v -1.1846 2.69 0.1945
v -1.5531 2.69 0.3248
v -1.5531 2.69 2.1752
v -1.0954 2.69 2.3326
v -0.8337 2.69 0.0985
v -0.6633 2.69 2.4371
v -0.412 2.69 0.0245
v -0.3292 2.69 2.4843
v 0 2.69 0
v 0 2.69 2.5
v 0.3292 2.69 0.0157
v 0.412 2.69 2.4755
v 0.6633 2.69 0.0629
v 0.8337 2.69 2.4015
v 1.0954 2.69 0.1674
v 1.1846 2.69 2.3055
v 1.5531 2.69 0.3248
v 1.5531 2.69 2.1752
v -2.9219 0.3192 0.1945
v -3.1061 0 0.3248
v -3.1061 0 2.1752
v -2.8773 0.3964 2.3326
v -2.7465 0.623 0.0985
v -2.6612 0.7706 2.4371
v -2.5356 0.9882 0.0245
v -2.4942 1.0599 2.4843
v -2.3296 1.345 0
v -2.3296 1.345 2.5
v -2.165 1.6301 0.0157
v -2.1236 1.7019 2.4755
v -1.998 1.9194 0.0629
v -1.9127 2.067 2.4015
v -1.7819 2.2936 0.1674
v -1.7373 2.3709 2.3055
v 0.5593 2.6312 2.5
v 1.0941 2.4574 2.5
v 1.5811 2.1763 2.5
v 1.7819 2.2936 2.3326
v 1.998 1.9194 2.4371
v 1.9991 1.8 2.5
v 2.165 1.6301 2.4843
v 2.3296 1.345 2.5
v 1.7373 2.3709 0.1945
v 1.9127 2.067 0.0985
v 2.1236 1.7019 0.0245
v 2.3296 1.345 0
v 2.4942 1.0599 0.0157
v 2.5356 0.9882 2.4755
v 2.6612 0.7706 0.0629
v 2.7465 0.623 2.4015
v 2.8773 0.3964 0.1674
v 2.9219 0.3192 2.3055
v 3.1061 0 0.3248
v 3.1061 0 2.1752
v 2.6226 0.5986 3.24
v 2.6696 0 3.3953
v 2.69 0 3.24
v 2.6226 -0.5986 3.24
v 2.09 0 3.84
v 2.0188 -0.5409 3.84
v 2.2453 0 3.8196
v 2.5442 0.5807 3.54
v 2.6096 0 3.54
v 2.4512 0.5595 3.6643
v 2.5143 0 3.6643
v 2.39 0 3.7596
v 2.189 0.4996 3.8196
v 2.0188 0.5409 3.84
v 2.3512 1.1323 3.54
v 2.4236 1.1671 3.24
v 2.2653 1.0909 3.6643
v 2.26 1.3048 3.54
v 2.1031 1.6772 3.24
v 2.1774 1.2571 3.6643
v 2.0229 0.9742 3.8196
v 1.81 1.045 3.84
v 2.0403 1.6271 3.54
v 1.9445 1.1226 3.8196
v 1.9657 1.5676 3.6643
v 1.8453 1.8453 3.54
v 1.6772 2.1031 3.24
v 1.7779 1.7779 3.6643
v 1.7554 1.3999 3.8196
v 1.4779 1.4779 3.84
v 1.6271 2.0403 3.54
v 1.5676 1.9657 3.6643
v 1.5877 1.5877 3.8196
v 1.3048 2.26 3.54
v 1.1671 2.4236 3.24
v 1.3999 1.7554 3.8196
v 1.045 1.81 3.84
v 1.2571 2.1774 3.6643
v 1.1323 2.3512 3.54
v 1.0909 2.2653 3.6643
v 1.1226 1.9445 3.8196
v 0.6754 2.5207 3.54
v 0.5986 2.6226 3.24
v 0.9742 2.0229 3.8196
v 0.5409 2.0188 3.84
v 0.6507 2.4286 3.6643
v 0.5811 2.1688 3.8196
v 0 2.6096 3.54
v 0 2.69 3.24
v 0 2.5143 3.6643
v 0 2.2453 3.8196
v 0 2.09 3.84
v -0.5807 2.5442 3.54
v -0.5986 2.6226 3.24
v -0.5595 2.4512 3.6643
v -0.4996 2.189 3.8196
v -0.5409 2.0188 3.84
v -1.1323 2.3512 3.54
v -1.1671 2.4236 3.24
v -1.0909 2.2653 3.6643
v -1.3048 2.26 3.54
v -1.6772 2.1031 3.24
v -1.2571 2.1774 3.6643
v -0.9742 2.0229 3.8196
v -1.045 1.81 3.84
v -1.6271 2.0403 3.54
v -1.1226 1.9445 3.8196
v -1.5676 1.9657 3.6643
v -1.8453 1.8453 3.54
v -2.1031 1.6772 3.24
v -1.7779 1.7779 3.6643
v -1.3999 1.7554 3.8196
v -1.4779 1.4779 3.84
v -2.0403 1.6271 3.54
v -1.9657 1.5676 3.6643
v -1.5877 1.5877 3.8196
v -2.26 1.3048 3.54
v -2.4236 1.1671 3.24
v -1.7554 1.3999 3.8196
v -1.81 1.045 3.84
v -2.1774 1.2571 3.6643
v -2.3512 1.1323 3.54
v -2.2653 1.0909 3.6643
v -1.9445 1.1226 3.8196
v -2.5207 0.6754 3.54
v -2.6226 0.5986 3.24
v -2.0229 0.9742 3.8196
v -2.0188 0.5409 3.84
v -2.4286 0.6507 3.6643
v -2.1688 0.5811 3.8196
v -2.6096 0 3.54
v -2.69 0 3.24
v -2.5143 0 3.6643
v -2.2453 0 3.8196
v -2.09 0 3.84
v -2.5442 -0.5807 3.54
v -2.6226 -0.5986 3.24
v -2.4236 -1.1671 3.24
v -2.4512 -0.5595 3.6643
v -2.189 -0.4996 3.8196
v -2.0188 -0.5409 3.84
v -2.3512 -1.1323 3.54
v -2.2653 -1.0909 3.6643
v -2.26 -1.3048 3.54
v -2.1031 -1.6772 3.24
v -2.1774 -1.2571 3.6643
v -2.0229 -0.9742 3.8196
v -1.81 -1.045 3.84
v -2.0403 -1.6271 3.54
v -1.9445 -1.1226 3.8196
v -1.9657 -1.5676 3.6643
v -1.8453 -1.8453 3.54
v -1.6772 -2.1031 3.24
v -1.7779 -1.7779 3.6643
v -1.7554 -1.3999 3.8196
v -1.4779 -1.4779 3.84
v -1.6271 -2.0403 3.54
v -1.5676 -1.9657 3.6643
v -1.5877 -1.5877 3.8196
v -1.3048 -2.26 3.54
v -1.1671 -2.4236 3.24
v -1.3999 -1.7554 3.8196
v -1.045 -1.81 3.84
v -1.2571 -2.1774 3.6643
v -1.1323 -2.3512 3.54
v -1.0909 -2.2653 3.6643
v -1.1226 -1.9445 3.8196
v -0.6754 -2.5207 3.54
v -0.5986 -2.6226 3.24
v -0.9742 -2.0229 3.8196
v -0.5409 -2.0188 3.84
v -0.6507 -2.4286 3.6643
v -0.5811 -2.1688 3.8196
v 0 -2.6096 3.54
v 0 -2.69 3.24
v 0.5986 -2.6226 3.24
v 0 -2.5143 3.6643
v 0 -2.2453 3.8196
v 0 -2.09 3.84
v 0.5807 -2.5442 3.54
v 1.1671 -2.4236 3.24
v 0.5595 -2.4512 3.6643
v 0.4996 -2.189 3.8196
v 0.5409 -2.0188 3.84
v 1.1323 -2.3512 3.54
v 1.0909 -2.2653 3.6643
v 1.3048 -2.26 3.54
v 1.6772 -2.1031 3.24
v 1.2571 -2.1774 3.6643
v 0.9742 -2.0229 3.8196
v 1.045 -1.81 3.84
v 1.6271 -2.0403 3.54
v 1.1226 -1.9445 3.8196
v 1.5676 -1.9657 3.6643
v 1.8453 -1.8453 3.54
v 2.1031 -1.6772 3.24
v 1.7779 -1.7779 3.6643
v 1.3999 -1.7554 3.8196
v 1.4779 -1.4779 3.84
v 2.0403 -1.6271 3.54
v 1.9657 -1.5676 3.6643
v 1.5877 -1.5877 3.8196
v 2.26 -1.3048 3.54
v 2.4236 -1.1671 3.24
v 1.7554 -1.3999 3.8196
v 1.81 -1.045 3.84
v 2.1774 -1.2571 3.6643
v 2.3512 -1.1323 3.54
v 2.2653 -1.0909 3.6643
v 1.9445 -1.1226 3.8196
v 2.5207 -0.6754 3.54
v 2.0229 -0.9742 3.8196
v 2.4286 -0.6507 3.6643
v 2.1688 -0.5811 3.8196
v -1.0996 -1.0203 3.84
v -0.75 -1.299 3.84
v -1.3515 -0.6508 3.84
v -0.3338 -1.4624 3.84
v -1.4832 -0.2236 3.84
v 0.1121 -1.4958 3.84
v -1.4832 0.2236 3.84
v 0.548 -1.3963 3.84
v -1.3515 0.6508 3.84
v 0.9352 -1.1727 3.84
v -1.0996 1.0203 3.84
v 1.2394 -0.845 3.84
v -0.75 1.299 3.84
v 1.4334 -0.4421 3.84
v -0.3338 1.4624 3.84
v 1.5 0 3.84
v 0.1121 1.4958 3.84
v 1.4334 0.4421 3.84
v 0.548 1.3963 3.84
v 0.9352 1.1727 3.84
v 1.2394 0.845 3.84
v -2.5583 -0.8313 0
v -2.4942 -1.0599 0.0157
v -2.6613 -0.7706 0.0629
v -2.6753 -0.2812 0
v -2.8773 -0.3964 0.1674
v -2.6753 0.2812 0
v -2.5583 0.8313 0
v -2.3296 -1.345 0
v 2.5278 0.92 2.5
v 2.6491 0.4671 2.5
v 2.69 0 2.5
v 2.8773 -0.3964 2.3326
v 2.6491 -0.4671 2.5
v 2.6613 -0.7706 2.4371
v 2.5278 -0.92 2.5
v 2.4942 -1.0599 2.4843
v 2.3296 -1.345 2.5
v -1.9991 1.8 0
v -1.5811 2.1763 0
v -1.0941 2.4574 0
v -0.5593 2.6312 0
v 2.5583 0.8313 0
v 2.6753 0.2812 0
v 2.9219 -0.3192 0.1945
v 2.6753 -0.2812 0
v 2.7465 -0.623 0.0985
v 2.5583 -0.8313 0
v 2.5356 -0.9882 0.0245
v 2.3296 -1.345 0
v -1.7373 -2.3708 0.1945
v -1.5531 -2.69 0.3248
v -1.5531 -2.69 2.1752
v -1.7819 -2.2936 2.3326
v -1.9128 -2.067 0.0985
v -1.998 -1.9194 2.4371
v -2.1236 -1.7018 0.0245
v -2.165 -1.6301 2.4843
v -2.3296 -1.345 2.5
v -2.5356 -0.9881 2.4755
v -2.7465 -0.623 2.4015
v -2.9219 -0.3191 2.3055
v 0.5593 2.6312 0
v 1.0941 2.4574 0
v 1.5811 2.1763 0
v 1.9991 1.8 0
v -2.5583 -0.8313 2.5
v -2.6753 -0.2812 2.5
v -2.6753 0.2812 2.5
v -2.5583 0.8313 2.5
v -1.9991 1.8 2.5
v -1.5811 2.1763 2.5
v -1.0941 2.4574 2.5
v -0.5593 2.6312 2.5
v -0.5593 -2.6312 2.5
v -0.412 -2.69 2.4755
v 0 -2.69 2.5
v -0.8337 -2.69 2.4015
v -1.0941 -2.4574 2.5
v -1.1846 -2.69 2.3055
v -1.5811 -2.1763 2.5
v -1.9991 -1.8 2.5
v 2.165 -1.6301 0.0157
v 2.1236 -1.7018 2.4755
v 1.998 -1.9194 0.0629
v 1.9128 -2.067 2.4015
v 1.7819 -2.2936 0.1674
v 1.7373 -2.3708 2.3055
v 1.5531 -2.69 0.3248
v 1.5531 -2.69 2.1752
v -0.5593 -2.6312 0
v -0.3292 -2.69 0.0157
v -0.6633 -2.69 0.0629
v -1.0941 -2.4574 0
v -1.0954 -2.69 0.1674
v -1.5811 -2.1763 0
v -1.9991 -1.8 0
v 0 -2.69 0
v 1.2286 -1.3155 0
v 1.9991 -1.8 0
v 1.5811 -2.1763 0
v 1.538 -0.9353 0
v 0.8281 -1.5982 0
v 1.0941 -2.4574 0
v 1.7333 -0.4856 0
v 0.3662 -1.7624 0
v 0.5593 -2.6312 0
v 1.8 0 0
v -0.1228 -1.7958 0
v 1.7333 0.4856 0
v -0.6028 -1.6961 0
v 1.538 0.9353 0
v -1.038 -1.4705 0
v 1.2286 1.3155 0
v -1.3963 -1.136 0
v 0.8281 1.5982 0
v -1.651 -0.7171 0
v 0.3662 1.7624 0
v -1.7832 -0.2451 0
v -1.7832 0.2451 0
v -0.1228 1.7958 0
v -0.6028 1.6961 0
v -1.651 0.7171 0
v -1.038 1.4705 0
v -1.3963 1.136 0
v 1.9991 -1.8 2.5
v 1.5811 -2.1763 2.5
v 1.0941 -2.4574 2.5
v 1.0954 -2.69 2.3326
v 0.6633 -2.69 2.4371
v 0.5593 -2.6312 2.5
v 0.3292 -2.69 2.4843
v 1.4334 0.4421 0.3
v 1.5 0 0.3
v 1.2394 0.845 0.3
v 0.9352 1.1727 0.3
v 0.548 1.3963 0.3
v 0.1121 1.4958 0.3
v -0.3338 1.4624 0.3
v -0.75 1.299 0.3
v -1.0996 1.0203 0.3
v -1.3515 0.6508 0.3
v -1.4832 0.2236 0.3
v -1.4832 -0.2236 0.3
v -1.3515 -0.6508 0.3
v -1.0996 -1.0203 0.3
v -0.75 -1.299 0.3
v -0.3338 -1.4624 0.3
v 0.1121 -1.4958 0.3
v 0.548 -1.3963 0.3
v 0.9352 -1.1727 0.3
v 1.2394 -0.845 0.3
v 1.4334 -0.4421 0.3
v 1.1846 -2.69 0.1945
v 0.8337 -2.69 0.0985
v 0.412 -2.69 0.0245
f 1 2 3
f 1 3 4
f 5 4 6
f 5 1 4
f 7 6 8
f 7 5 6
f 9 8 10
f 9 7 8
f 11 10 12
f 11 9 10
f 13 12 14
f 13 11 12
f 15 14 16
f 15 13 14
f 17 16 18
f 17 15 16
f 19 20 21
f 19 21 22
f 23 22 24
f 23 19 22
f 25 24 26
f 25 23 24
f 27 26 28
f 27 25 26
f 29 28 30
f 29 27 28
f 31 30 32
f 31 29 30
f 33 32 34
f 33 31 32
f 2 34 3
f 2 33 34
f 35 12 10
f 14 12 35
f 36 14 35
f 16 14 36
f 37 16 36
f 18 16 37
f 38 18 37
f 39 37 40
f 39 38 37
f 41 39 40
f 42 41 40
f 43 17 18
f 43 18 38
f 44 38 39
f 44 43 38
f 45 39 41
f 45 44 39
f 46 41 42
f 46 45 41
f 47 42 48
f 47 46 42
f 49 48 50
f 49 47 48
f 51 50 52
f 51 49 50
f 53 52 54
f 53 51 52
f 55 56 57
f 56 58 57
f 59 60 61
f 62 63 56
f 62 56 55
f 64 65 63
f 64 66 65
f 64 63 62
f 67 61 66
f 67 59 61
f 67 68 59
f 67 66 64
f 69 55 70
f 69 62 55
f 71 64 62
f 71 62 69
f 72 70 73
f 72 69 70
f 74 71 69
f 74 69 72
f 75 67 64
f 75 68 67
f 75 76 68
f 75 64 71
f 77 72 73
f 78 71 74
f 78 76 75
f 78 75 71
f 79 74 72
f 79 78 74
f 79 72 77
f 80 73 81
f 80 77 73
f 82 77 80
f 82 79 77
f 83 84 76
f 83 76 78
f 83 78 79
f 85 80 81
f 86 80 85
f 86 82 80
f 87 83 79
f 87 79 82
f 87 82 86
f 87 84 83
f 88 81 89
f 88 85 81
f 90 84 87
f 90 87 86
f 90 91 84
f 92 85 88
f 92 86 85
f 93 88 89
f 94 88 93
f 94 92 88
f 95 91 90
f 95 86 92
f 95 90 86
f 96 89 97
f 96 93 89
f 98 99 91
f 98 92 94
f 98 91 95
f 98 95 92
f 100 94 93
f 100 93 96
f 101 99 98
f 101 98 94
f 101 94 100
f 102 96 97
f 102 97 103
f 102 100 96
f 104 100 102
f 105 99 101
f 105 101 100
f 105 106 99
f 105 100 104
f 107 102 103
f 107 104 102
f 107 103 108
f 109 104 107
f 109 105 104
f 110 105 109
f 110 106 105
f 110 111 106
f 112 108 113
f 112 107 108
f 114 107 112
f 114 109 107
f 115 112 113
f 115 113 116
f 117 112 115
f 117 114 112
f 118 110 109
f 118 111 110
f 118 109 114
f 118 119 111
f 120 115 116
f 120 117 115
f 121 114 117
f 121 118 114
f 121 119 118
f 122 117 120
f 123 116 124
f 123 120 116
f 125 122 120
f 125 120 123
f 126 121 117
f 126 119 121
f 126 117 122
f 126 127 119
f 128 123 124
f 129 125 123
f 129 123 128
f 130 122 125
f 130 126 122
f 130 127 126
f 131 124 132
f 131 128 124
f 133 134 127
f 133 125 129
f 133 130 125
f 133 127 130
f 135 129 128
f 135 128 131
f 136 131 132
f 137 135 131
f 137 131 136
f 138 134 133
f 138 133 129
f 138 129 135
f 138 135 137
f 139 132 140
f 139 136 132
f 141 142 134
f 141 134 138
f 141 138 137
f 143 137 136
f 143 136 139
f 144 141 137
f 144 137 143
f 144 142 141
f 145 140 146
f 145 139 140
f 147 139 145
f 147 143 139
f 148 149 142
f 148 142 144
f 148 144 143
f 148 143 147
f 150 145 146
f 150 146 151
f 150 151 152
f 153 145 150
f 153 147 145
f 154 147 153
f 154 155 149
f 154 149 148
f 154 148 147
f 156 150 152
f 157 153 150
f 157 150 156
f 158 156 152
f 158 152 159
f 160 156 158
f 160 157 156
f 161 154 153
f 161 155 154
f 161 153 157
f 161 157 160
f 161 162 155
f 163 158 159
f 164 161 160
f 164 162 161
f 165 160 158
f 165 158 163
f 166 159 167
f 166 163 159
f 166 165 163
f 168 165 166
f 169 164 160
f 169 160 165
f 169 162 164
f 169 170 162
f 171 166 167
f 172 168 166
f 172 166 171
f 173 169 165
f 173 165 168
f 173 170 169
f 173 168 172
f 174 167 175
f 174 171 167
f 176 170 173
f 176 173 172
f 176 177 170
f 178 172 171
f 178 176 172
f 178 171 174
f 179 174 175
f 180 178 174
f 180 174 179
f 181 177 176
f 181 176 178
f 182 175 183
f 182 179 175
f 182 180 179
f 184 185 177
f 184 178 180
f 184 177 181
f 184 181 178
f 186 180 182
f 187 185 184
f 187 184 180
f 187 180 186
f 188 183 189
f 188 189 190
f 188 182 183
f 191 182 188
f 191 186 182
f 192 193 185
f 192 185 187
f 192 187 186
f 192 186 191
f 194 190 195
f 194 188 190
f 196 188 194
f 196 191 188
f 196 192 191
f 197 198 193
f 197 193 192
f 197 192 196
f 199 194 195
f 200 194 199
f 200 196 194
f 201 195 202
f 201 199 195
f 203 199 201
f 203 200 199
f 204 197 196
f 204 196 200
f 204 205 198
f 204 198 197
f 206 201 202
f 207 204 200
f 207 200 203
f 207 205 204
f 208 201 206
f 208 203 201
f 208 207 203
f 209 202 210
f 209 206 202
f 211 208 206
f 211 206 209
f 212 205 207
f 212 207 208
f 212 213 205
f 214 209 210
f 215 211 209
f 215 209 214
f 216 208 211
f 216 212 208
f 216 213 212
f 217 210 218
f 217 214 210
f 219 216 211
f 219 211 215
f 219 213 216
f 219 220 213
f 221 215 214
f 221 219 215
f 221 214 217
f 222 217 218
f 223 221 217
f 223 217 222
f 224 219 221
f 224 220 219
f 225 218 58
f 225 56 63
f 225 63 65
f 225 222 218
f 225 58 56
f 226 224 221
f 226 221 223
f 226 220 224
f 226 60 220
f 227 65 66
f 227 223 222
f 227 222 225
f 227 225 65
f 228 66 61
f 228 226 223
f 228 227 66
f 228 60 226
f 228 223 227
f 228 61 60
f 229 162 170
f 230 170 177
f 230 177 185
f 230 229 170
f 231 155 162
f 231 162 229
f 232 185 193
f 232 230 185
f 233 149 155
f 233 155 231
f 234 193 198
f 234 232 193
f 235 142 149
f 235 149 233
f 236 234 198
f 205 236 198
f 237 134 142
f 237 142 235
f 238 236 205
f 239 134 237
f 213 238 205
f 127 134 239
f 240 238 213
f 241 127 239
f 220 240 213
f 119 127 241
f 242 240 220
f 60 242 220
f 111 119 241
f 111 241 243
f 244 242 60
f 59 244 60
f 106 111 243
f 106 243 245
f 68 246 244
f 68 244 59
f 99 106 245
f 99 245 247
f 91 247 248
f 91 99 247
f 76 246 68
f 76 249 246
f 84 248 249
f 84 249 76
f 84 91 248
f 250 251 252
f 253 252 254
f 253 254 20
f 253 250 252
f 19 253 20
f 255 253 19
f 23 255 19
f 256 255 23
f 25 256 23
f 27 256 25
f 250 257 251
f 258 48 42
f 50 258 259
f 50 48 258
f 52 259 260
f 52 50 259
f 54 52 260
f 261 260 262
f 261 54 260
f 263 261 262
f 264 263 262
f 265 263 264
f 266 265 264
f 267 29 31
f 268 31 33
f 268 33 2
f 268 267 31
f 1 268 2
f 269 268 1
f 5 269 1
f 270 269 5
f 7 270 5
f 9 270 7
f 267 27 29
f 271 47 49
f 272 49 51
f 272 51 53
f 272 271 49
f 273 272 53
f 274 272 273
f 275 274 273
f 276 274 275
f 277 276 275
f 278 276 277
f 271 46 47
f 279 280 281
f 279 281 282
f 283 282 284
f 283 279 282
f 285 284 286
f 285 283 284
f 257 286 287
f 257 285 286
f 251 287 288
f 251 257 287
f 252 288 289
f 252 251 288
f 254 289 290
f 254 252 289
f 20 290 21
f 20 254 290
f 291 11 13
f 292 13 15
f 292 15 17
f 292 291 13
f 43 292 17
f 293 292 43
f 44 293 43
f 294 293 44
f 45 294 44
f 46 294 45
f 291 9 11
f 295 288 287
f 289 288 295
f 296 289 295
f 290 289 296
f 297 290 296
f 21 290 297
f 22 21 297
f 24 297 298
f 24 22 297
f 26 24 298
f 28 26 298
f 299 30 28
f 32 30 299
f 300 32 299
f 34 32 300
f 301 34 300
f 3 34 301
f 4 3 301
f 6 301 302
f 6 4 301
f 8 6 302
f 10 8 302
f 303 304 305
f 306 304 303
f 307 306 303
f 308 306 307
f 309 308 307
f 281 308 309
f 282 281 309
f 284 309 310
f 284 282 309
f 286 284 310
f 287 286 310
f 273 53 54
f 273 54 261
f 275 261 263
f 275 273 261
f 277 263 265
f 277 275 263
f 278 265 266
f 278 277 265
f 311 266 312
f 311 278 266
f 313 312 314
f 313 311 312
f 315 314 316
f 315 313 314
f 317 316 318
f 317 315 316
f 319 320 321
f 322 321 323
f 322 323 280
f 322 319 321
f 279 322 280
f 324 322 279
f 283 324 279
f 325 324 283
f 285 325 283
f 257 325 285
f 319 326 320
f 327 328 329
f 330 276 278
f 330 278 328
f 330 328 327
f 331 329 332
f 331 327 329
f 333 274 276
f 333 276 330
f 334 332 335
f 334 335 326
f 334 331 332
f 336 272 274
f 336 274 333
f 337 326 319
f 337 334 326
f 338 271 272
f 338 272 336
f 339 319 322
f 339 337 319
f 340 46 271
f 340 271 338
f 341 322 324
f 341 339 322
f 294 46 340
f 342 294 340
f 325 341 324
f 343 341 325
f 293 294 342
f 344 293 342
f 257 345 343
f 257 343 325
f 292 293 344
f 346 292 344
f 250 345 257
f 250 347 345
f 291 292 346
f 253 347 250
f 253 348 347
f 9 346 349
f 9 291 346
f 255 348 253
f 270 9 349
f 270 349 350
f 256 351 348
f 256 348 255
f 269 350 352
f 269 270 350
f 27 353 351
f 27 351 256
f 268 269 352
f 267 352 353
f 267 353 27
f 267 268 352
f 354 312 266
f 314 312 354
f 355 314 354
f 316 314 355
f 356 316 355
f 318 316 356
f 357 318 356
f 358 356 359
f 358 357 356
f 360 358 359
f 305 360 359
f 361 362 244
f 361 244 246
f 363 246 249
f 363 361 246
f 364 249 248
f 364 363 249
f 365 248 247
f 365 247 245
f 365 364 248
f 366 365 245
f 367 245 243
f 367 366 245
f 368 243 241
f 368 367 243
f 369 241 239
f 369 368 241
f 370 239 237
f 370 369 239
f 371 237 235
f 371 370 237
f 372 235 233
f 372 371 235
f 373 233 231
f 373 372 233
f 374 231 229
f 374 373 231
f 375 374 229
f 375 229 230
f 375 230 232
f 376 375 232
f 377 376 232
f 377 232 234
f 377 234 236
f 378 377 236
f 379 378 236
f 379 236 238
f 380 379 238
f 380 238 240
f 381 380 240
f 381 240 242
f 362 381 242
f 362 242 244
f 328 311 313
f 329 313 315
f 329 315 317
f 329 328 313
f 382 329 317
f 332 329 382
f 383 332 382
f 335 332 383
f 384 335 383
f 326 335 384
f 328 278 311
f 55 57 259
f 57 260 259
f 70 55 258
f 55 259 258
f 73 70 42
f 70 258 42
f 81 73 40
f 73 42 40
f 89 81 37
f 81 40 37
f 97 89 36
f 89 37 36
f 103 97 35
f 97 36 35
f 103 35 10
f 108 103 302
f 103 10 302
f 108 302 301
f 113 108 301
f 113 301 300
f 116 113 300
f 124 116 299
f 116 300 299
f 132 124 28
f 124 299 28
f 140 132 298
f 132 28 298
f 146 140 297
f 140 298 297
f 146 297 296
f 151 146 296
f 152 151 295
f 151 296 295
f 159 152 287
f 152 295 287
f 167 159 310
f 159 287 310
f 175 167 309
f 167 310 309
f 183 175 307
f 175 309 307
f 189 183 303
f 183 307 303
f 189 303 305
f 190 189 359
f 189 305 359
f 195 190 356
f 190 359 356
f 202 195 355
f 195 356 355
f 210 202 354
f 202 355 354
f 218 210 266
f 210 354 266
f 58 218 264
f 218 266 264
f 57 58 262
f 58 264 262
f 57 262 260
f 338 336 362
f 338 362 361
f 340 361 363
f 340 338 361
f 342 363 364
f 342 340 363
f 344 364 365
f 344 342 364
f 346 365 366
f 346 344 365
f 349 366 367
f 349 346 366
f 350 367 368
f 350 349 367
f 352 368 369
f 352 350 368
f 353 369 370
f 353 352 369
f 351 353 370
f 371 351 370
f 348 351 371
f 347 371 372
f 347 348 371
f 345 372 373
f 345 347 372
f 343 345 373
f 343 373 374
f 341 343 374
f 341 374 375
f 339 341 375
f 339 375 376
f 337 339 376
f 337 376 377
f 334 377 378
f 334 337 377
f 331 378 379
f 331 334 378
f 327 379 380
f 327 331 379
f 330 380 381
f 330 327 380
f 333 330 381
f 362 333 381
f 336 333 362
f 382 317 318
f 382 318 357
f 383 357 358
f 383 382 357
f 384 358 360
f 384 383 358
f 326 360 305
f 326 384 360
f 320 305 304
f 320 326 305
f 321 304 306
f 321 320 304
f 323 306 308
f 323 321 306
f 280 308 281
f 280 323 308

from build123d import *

# Parameters (mm, degrees)
SKETCH1_R           = 1.5
BOSS_EXTRUDE1_DEPTH = 2.5
SKETCH2_R           = 2.69
SKETCH2_R_2         = 1.5
BOSS_EXTRUDE2_DEPTH = 1.34
FILLET1_R           = 0.6
CHAMFER1_SIZE       = 0.3


with BuildPart() as part:
    # Sketch1 → Boss-Extrude1 (new body)
    with BuildSketch(Plane.XY):
        Polygon((-1.553072224, 2.69), (1.553072224, 2.69), (3.106144448, 0), (1.553072224, -2.69), (-1.553072224, -2.69), (-3.106144448, 0), align=None)
        Circle(SKETCH1_R, mode=Mode.SUBTRACT)
    extrude(amount=BOSS_EXTRUDE1_DEPTH)

    # Sketch2 → Boss-Extrude2 (add)
    with BuildSketch(Plane.XY.offset(2.5)):
        Circle(SKETCH2_R)
        Circle(SKETCH2_R_2, mode=Mode.SUBTRACT)
    extrude(amount=BOSS_EXTRUDE2_DEPTH)

    # Fillet1
    fillet1_edges = [part.edges().sort_by_distance(p)[0] for p in [
        (-2.69, 0, 3.84),
    ]]
    fillet(fillet1_edges, radius=FILLET1_R)

    # Sketch3 → Cut-Revolve1 (revolve, cut)
    with BuildSketch(Plane(origin=(0, 0, 0), x_dir=(0, 0, -1), z_dir=(1, 0, 0))):
        Polygon((-2.5, 2.69), (-2.109788941, 3.19), (-0.390211059, 3.19), (0, 2.69), (0, 3.325081684), (-2.5, 3.325081684), align=None)
    revolve(axis=Axis((0, 0, 0), (0, 0, -1)), mode=Mode.SUBTRACT)

    # Chamfer1
    chamfer1_edges = [part.edges().sort_by_distance(p)[0] for p in [
        (-1.5, 0, 0),
    ]]
    chamfer(chamfer1_edges, length=CHAMFER1_SIZE)


solid = part.part
